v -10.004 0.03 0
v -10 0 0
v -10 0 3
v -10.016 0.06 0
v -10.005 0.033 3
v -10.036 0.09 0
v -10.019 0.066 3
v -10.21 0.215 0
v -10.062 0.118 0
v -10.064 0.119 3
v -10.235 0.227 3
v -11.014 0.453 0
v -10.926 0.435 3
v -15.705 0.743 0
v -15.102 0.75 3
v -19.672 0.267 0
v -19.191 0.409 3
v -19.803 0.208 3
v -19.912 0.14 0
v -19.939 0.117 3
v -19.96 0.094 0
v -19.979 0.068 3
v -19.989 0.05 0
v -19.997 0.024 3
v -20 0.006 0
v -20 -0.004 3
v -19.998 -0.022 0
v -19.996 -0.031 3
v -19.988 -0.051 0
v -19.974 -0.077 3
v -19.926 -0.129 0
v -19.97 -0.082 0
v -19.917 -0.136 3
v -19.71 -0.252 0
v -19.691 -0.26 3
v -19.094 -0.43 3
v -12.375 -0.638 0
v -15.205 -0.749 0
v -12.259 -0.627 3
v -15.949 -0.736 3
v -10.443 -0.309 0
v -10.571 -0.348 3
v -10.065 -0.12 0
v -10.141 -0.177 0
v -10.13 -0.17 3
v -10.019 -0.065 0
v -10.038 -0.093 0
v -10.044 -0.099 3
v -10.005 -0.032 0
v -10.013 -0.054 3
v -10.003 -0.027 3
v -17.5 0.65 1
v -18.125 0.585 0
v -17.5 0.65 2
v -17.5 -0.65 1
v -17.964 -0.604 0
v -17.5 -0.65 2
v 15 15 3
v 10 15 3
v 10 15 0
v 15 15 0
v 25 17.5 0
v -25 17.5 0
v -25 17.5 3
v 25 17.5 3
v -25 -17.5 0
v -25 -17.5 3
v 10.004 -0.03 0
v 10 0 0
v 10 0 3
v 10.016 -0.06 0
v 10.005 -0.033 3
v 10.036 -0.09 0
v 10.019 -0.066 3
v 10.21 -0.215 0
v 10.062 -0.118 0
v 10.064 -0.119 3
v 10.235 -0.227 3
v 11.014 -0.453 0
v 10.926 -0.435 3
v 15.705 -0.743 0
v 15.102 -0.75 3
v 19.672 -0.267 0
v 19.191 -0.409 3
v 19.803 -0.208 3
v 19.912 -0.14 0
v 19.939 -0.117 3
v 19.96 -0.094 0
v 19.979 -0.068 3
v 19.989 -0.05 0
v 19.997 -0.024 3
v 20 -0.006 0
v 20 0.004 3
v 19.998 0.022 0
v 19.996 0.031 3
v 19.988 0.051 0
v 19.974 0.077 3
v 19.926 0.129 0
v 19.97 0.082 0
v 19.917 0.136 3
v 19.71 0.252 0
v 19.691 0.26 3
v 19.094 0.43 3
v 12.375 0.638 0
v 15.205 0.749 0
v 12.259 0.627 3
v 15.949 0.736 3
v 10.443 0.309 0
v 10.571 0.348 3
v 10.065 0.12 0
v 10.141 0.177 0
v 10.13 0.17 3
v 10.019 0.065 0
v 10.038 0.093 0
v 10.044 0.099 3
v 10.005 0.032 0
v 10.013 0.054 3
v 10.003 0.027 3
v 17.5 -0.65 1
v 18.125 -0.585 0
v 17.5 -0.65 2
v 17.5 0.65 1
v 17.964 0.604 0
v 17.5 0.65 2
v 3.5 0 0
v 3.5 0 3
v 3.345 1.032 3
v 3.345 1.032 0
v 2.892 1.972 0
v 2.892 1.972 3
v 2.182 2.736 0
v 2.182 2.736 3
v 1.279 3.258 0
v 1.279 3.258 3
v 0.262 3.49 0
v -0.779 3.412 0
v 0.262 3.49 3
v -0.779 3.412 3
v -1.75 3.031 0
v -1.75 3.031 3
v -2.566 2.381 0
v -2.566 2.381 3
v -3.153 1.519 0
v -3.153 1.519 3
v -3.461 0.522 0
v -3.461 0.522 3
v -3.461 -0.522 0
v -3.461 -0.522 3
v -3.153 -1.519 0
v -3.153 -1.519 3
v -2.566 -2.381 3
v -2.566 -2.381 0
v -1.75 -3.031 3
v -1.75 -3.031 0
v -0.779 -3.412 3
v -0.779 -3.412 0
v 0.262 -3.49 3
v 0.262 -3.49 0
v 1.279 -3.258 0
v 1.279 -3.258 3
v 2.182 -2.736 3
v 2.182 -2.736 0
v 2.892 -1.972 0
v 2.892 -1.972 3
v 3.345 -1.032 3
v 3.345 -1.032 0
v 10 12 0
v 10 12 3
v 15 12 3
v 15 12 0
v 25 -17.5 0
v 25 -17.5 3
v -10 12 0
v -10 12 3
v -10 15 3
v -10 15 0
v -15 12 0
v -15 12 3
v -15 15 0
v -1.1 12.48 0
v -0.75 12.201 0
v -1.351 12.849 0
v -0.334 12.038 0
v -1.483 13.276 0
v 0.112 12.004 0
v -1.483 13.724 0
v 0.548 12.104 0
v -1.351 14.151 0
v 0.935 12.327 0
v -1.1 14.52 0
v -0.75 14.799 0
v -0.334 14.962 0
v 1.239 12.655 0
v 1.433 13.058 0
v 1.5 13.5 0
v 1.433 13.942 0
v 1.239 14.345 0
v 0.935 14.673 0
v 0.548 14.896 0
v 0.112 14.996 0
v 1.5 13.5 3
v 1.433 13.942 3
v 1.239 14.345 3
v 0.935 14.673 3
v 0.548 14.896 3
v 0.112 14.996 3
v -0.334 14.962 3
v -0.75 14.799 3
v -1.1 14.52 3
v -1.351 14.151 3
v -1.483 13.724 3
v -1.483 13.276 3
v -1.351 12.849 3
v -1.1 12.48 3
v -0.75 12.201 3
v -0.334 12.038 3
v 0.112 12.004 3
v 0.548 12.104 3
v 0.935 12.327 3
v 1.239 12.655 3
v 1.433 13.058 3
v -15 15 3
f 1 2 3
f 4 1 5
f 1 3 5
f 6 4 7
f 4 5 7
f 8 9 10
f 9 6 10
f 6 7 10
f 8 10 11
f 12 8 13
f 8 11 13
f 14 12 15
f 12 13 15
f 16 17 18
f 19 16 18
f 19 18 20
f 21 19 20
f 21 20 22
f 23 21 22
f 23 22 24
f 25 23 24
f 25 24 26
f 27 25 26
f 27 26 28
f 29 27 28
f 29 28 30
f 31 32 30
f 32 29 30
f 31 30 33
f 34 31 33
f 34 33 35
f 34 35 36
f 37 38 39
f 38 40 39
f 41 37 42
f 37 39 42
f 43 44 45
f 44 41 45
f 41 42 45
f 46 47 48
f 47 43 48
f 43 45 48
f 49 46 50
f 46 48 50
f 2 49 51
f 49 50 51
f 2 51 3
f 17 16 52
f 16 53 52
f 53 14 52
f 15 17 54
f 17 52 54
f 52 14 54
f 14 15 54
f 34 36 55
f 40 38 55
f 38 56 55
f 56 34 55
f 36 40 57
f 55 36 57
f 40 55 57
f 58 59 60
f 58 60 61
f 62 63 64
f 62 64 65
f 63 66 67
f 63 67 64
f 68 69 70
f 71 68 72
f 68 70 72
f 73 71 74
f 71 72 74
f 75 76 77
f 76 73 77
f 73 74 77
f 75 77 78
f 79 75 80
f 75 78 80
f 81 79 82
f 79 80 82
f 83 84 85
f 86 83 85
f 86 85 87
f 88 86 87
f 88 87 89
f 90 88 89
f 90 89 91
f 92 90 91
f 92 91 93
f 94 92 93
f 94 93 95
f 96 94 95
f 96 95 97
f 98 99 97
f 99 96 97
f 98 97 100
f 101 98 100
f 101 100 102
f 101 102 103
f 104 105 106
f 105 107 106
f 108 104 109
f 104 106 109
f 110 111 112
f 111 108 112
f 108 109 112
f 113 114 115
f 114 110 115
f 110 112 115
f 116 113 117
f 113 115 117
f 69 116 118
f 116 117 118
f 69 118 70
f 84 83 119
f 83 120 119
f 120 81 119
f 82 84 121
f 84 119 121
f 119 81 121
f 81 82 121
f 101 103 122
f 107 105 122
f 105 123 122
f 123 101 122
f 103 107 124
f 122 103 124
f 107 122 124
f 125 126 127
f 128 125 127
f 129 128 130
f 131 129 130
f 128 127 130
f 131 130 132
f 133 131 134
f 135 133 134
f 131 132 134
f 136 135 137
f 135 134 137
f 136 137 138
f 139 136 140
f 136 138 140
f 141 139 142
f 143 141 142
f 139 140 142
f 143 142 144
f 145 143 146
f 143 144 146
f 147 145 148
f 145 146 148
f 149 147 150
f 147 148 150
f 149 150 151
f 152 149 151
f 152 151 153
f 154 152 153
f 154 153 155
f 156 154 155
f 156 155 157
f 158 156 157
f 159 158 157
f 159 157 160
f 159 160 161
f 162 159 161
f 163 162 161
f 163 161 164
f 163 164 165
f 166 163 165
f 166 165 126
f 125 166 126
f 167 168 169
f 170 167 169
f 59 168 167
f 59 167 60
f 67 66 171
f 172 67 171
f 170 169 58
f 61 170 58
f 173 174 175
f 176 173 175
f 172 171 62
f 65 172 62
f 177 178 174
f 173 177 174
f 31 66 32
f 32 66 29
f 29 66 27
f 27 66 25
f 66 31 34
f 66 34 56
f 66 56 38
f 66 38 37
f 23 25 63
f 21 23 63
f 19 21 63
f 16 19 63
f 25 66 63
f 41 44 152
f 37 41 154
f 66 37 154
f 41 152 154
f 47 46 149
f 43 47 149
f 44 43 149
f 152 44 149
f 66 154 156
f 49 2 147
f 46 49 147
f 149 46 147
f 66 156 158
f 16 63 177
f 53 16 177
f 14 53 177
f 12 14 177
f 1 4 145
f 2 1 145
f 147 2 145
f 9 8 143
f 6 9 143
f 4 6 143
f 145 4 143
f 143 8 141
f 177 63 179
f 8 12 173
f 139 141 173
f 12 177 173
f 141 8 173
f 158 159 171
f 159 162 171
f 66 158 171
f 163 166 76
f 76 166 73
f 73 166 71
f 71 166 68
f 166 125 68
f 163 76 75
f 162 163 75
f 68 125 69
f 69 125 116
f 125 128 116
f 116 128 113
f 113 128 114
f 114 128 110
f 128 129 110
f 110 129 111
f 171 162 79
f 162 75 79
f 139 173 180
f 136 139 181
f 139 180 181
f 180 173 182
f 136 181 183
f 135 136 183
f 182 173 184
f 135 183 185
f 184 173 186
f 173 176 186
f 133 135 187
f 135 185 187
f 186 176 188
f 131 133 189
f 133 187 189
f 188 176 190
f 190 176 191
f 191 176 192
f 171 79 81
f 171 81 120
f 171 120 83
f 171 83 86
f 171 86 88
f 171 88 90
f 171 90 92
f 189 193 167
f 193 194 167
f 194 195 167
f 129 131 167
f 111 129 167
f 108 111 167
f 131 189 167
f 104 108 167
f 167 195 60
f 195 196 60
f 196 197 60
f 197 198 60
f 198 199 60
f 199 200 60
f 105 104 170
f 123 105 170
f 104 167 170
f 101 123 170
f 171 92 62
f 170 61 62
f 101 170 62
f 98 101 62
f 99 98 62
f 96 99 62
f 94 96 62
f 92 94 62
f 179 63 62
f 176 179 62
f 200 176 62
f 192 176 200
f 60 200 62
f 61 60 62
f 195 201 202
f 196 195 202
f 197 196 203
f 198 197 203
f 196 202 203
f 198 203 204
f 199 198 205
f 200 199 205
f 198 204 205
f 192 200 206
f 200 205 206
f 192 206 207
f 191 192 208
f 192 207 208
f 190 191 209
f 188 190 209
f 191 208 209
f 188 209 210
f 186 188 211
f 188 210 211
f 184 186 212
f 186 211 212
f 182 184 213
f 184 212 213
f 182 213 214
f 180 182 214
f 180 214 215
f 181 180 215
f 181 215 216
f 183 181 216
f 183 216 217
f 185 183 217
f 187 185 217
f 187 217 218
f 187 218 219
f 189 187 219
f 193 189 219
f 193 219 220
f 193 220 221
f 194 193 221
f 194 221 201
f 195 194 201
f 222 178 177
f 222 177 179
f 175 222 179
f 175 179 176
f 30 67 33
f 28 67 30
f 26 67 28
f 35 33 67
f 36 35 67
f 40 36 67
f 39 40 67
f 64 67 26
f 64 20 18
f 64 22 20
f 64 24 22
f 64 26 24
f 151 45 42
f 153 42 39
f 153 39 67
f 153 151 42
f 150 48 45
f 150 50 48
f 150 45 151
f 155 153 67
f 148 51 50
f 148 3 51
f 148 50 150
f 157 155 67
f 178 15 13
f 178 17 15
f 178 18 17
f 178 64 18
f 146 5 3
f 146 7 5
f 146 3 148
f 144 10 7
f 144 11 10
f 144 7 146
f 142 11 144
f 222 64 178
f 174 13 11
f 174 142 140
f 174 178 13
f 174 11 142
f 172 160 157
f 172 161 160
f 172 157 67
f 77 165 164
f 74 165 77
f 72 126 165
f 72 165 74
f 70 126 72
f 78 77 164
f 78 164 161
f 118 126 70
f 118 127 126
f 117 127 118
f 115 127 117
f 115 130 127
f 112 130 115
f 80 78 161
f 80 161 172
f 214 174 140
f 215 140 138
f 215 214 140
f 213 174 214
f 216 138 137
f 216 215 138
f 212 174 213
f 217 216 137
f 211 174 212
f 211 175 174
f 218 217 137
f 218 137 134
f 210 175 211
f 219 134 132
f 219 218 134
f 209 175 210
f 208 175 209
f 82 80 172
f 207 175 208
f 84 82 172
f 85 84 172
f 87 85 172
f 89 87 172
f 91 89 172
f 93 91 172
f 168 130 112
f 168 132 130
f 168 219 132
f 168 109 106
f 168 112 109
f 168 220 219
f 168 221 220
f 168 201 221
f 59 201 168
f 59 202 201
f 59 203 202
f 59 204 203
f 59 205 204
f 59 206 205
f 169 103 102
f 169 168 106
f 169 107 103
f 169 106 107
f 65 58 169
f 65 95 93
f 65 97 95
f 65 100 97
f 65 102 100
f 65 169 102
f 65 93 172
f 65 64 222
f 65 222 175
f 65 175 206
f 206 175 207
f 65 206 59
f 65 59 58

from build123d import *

# Parameters (mm, degrees)
F0_W     = 50
F0_H     = 35
F1_DEPTH = 3
F2_W     = 5
F2_H     = 3
F2_R     = 3.5
F2_R_2   = 1.5
F3_DEPTH = 25


with BuildPart() as f1:
    # F0 (on Top) → F1 (new body)
    with BuildSketch(Plane.XY):
        Rectangle(F0_W, F0_H)
    extrude(amount=F1_DEPTH)

    # F2 (on face) → F3 (cut)
    with BuildSketch(Plane.XY.offset(3)):
        with Locations((-12.5, 13.5)):
            Rectangle(F2_W, F2_H)
        with Locations((12.5, 13.5)):
            Rectangle(F2_W, F2_H)
        Circle(F2_R)
        with Locations((0, 13.5)):
            Circle(F2_R_2)
        with BuildLine():
            add(Edge.make_bspline(
                [(-10, 0), (-10, 1.299038), (-17.5, 0.649519), (-25, 0), (-17.5, -0.649519), (-10, -1.299038), (-10, 0)],
                knots=[0, 0, 0, 2.094395, 2.094395, 4.18879, 4.18879, 6.283185, 6.283185, 6.283185], degree=2, weights=[1, 0.5, 1, 0.5, 1, 0.5, 1]))
        make_face()
        with BuildLine():
            add(Edge.make_bspline(
                [(10, 0), (10, -1.299038), (17.5, -0.649519), (25, 0), (17.5, 0.649519), (10, 1.299038), (10, 0)],
                knots=[0, 0, 0, 2.094395, 2.094395, 4.18879, 4.18879, 6.283185, 6.283185, 6.283185], degree=2, weights=[1, 0.5, 1, 0.5, 1, 0.5, 1]))
        make_face()
    extrude(amount=-F3_DEPTH, mode=Mode.SUBTRACT)


solid = f1.part
